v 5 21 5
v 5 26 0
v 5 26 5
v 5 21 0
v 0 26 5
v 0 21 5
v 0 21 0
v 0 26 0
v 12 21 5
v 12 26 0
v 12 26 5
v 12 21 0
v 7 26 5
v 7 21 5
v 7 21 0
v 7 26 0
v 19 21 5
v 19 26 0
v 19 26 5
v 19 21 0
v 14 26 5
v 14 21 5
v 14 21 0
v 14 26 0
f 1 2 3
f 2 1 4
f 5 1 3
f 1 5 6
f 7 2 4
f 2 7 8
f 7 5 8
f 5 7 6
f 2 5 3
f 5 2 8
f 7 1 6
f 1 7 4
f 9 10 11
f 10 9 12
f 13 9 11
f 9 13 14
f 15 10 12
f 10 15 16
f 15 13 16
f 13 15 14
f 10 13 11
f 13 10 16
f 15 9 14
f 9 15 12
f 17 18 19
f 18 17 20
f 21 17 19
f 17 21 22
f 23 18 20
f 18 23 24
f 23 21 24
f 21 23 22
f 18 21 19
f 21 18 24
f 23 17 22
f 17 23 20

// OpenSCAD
// Parameters for the grid size and cube size
cube_size = 10;  // Side length of each cube
grid_size_X = 5;   // Grid dimensions (grid_size x grid_size)
grid_size_Y = 5;
Count = 10;

//Generate_Grid_3();

//Generate_Grid_2(){
//    translate([0,-10,0]){
//        cylinder(h=15,d=3,$fn=12);
//    }
//    translate([0,-20,0]){
//        cylinder(h=15,d=3,$fn=12);
//    }
//    translate([0,-30,0]){
//        cylinder(h=15,d=3,$fn=12);
//    }
//    translate([0,-40,0]){
//        cylinder(h=15,d=3,$fn=12);
//    }
//    translate([0,-50,0]){
//        cylinder(h=15,d=3,$fn=12);
//    }
//    translate([0,-60,0]){
//        cylinder(h=15,d=3,$fn=12);
//    }
//}
module Generate_Grid() {
    // Generate grid of cubes with alternating colors
    for (y = [0 : 1  : grid_size_Y-1 ]) {
        for(x = [ 0 : (-1^y)*-1: ((grid_size_X-1)*-1^y)*-1 ]){
    //        color_ = get_color(1/(grid_size-1), 0, 0);
    //        echo(x);
    //        echo(color_);
            echo("y",y);
            echo("x",x);
            echo("hello", (-1)^y);
            echo("Color_y",(1/(grid_size_Y-1))*y);
            echo("Color_x",(1/(grid_size_X-1))*x*(-1^y));
            translate([x * cube_size, y * cube_size, 0 * cube_size]) {
                color(c = [ ((1/(grid_size_X-1))*x*(-1^y))*-1,(1/(grid_size_Y-1))*y,0], alpha = 0.5){
                    cube(cube_size);
                    children();
                }
            }
        }
    }
}
module Generate_Grid_2(){
    // Generate grid of cubes with alternating colors
    for(i=[0:1:$children-1]){
        for (y = [0 : 1  : grid_size_Y-1 ]) {
            for(x = [ 0 : (-1^y)*-1: ((grid_size_X-1)*-1^y)*-1 ]){
        //        color_ = get_color(1/(grid_size-1), 0, 0);
        //        echo(x);
        //        echo(color_);
                echo("y",y);
                echo("x",x);
                echo("hello", (-1)^y);
                echo("Color_y",(1/(grid_size_Y-1))*y);
                echo("Color_x",((1/(grid_size_X-1))*x*(-1^y))*-1);
                echo("$children",$children);
                echo("((grid_size_Y-1)*(grid_size_X-1))/$children",((grid_size_Y-1)*(grid_size_X-1))/$children);
                color(c = [ ((1/(grid_size_X-1))*x*(-1^y))*-1,(1/(grid_size_Y-1))*y,0], alpha = 0.5){
                    //cube(cube_size);
                    translate([grid_size_X*x,0,0]){
                        children(((grid_size_Y-1)*(grid_size_X-1))/$children);
                    }
                }
            }
        }
    }
}
module Generate_Grid_3() {
    // Generate grid of cubes with alternating colors
    for (y = [0 : 1  : grid_size_Y-1 ]) {
        for(x = [ 0 : (-1^y)*-1: ((grid_size_X-1)*-1^y)*-1 ]){
    //        color_ = get_color(1/(grid_size-1), 0, 0);
    //        echo(x);
    //        echo(color_);
            echo("y",y);
            echo("x",x);
            echo("hello", (-1)^y);
            echo("Color_y",(1/(grid_size_Y-1))*y);
            echo("Color_x",((1/(grid_size_X-1))*x*(-1^y))*-1);
            translate([x * cube_size, y * cube_size, 0 * cube_size]) {
                color(c = [ ((1/(grid_size_X-1))*x*(-1^y))*-1,(1/(grid_size_Y-1))*y,0], alpha = 0.5){
                    cube(cube_size);
                    children();
                }
            }
        }
    }
}
translate([0,-50,0]){
    //meander();
}
module meander(){
END_x=3;
END_y=3;
    //for(i=[0:1:(END_x*END_y)-1]){
        for(x=[0:1:END_x-1]){
            for(y=[(END_y-1):1:0]){
                echo("x",x);
                echo("y",y);
                translate([x*11,y*11,0]){
                    cube(100);
                }
            } 
        }
    //}
}
//For_Downstepp();
module For_Downstepp(){
    for(j=[-5:1:0]){
        translate([-j*11,-75,20]){
            cube(10);
        }
    }
}

n = 5;
m = 3;
o = 5;
a = 0;
b = 1;
result_1 = [ [for (i=[0:m-1]) (i % 2 == 0) ? a : b ],[for (j=[0:m-1]) (j % 2 != 0) ? a : b] ];
result_2 = [ for(j=[0:1:n-1])[j], for(j=[0:1:n-1])[j] ];
result_3 = [for(i=[0:1:n*n])[   i,
                                (i % 2 != 0) ? i/2 : 9,
                                0]];
result_4 = [for(i=[1:1:(n*n)])[i,[red(i),green(i)]]];
echo("result_1",result_1); //ECHO: [0, 1, 0, 1, 0, 1, 0, 1, 0, 1]
echo("result_3",result_2);
echo("result_3",result_3);
echo("result_4",result_4);

function add_up_to(n, sum=0) =
    n==0 ?
        sum :
        add_up_to(n-1, sum+n);
 
echo(sum=add_up_to(3));
// ECHO: sum = 5.00005e+009

function red(RED) = ( (RED <= n) ? RED : RED - n); // for(i=[0:n-1]) (i % 2 == 0 ) ? 1:0  
function green(GREEN) = ((GREEN % 2 == 0) ? GREEN % 1: GREEN );
//function blue(BLUE) = (BLUE<=n*n)? 0:1;


echo("let",let(a = 135, s = sin(a), c = cos(a)) [ s, c ]); // ECHO: [0.707107, -0.707107]

//for (i = [10:50]) // creates a spiral of incrisingly sized spheres
//{
//    let (angle = i*360/20, r= i*2, distance = r*5)
//    {
//        rotate(angle, [1, 0, 0])
//        translate([0, distance, 0])
//        sphere(r = r);
//    }
//}

for(i=[0:1:17]){
    for(n=[1:-2:-1]){
        for(j_y=[0:1:8-1]){
            for(m=[-1:2:1]){
                for (j_x=[0:1*n:8-1]){
                    let(x_Step= j_x*6 , y_Step=i/2*6*n, z_Step=i/3*6){
                        translate([x_Step,y_Step,z_Step]){
//                            cube(5);
                        }
                    }
                }
            }
        }
    }
}

//let_for_LOOP();

module let_for_LOOP(){
    for(n=[-1:2:1]){
        for(m=[0:1:5]){
            let(x_Step=6*m*n,y_Step=6*n,z_Step=0){
                translate([x_Step,y_Step,z_Step]){
                    //cube(5);
                    echo("m",m);
                    echo("n",n);
                    text(str(m), font = "Liberation Sans");
                }
            }
        }
    }
}
//SINE_Foo();
module SINE_Foo(){
    CubeCount=7;
    CubeCount_SINE=360/CubeCount;
    for(m=[0:30:360]){
        for(n=[0:30:360]){
            echo("m",m);
            echo("n",n);
            let(x_Step=sin(m)*10){
                translate([(m*5)/30,0,x_Step]){
                    cube(5);
                }
            }
        }
    }
}
//anzColor=4;
1_r=1;
//Recursive_Color_Cube();
module Recursive_Color_Cube(r=1,anzColor=3){
    echo("anzColor^3",anzColor*anzColor*anzColor);
    echo("anzColor",anzColor);
    if(anzColor*anzColor>=0){
        for(n=[0*1_r:1:2]){
            for(m=[0:1:anzColor]){
                translate([n*7,m*7,0]){
                    color(c=[1/(n+1),1/(m+1),0.5],alpha = 0.5){
                        cube(5);
                    }
                    Recursive_Color_Cube(-1,anzColor-1);
                }
            }
        }
    }
}
anzColor_x=3;
r=1;
2_Recursive_Color_Cube();
module 2_Recursive_Color_Cube(r=1,n,anzColor_y=3){
    //echo("anzColor",anzColor);
    //if(anzColor*anzColor>=0){
    //for(m=[0:1:anzColor_y-1]){
        //echo("anzColor_y",anzColor_y);
        for(n=[0:1:anzColor_x-1]){
            echo("anzColor_x",anzColor_x);
            translate([n*7,m*7,0]){
                color(c=[0,1/(m+1),0.5],alpha = 0.5){
                    cube(5);
                }
            }
        }
        //2_Recursive_Color_Cube(-1,n-1,anzColor_y);
    //}
    //}
    //2_Recursive_Color_Cube(-1,anzColor_x,anzColor_y-1);
}
////example 3 - iteration over a vector of vectors
//for(i = [ [[ 0,  0,  0], 20],
//          [[10, 12, 10], 50],
//          [[20, 24, 20], 70],
//          [[30, 36, 30], 10],
//          [[20, 48, 40], 30],
//          [[10, 60, 50], 40] ]){
//  translate([i[0][0], 2*i[0][1], 0])
//  cube([10, 15, i[1]]);
//}
//Generate_Grid(); // Run the grid generation
